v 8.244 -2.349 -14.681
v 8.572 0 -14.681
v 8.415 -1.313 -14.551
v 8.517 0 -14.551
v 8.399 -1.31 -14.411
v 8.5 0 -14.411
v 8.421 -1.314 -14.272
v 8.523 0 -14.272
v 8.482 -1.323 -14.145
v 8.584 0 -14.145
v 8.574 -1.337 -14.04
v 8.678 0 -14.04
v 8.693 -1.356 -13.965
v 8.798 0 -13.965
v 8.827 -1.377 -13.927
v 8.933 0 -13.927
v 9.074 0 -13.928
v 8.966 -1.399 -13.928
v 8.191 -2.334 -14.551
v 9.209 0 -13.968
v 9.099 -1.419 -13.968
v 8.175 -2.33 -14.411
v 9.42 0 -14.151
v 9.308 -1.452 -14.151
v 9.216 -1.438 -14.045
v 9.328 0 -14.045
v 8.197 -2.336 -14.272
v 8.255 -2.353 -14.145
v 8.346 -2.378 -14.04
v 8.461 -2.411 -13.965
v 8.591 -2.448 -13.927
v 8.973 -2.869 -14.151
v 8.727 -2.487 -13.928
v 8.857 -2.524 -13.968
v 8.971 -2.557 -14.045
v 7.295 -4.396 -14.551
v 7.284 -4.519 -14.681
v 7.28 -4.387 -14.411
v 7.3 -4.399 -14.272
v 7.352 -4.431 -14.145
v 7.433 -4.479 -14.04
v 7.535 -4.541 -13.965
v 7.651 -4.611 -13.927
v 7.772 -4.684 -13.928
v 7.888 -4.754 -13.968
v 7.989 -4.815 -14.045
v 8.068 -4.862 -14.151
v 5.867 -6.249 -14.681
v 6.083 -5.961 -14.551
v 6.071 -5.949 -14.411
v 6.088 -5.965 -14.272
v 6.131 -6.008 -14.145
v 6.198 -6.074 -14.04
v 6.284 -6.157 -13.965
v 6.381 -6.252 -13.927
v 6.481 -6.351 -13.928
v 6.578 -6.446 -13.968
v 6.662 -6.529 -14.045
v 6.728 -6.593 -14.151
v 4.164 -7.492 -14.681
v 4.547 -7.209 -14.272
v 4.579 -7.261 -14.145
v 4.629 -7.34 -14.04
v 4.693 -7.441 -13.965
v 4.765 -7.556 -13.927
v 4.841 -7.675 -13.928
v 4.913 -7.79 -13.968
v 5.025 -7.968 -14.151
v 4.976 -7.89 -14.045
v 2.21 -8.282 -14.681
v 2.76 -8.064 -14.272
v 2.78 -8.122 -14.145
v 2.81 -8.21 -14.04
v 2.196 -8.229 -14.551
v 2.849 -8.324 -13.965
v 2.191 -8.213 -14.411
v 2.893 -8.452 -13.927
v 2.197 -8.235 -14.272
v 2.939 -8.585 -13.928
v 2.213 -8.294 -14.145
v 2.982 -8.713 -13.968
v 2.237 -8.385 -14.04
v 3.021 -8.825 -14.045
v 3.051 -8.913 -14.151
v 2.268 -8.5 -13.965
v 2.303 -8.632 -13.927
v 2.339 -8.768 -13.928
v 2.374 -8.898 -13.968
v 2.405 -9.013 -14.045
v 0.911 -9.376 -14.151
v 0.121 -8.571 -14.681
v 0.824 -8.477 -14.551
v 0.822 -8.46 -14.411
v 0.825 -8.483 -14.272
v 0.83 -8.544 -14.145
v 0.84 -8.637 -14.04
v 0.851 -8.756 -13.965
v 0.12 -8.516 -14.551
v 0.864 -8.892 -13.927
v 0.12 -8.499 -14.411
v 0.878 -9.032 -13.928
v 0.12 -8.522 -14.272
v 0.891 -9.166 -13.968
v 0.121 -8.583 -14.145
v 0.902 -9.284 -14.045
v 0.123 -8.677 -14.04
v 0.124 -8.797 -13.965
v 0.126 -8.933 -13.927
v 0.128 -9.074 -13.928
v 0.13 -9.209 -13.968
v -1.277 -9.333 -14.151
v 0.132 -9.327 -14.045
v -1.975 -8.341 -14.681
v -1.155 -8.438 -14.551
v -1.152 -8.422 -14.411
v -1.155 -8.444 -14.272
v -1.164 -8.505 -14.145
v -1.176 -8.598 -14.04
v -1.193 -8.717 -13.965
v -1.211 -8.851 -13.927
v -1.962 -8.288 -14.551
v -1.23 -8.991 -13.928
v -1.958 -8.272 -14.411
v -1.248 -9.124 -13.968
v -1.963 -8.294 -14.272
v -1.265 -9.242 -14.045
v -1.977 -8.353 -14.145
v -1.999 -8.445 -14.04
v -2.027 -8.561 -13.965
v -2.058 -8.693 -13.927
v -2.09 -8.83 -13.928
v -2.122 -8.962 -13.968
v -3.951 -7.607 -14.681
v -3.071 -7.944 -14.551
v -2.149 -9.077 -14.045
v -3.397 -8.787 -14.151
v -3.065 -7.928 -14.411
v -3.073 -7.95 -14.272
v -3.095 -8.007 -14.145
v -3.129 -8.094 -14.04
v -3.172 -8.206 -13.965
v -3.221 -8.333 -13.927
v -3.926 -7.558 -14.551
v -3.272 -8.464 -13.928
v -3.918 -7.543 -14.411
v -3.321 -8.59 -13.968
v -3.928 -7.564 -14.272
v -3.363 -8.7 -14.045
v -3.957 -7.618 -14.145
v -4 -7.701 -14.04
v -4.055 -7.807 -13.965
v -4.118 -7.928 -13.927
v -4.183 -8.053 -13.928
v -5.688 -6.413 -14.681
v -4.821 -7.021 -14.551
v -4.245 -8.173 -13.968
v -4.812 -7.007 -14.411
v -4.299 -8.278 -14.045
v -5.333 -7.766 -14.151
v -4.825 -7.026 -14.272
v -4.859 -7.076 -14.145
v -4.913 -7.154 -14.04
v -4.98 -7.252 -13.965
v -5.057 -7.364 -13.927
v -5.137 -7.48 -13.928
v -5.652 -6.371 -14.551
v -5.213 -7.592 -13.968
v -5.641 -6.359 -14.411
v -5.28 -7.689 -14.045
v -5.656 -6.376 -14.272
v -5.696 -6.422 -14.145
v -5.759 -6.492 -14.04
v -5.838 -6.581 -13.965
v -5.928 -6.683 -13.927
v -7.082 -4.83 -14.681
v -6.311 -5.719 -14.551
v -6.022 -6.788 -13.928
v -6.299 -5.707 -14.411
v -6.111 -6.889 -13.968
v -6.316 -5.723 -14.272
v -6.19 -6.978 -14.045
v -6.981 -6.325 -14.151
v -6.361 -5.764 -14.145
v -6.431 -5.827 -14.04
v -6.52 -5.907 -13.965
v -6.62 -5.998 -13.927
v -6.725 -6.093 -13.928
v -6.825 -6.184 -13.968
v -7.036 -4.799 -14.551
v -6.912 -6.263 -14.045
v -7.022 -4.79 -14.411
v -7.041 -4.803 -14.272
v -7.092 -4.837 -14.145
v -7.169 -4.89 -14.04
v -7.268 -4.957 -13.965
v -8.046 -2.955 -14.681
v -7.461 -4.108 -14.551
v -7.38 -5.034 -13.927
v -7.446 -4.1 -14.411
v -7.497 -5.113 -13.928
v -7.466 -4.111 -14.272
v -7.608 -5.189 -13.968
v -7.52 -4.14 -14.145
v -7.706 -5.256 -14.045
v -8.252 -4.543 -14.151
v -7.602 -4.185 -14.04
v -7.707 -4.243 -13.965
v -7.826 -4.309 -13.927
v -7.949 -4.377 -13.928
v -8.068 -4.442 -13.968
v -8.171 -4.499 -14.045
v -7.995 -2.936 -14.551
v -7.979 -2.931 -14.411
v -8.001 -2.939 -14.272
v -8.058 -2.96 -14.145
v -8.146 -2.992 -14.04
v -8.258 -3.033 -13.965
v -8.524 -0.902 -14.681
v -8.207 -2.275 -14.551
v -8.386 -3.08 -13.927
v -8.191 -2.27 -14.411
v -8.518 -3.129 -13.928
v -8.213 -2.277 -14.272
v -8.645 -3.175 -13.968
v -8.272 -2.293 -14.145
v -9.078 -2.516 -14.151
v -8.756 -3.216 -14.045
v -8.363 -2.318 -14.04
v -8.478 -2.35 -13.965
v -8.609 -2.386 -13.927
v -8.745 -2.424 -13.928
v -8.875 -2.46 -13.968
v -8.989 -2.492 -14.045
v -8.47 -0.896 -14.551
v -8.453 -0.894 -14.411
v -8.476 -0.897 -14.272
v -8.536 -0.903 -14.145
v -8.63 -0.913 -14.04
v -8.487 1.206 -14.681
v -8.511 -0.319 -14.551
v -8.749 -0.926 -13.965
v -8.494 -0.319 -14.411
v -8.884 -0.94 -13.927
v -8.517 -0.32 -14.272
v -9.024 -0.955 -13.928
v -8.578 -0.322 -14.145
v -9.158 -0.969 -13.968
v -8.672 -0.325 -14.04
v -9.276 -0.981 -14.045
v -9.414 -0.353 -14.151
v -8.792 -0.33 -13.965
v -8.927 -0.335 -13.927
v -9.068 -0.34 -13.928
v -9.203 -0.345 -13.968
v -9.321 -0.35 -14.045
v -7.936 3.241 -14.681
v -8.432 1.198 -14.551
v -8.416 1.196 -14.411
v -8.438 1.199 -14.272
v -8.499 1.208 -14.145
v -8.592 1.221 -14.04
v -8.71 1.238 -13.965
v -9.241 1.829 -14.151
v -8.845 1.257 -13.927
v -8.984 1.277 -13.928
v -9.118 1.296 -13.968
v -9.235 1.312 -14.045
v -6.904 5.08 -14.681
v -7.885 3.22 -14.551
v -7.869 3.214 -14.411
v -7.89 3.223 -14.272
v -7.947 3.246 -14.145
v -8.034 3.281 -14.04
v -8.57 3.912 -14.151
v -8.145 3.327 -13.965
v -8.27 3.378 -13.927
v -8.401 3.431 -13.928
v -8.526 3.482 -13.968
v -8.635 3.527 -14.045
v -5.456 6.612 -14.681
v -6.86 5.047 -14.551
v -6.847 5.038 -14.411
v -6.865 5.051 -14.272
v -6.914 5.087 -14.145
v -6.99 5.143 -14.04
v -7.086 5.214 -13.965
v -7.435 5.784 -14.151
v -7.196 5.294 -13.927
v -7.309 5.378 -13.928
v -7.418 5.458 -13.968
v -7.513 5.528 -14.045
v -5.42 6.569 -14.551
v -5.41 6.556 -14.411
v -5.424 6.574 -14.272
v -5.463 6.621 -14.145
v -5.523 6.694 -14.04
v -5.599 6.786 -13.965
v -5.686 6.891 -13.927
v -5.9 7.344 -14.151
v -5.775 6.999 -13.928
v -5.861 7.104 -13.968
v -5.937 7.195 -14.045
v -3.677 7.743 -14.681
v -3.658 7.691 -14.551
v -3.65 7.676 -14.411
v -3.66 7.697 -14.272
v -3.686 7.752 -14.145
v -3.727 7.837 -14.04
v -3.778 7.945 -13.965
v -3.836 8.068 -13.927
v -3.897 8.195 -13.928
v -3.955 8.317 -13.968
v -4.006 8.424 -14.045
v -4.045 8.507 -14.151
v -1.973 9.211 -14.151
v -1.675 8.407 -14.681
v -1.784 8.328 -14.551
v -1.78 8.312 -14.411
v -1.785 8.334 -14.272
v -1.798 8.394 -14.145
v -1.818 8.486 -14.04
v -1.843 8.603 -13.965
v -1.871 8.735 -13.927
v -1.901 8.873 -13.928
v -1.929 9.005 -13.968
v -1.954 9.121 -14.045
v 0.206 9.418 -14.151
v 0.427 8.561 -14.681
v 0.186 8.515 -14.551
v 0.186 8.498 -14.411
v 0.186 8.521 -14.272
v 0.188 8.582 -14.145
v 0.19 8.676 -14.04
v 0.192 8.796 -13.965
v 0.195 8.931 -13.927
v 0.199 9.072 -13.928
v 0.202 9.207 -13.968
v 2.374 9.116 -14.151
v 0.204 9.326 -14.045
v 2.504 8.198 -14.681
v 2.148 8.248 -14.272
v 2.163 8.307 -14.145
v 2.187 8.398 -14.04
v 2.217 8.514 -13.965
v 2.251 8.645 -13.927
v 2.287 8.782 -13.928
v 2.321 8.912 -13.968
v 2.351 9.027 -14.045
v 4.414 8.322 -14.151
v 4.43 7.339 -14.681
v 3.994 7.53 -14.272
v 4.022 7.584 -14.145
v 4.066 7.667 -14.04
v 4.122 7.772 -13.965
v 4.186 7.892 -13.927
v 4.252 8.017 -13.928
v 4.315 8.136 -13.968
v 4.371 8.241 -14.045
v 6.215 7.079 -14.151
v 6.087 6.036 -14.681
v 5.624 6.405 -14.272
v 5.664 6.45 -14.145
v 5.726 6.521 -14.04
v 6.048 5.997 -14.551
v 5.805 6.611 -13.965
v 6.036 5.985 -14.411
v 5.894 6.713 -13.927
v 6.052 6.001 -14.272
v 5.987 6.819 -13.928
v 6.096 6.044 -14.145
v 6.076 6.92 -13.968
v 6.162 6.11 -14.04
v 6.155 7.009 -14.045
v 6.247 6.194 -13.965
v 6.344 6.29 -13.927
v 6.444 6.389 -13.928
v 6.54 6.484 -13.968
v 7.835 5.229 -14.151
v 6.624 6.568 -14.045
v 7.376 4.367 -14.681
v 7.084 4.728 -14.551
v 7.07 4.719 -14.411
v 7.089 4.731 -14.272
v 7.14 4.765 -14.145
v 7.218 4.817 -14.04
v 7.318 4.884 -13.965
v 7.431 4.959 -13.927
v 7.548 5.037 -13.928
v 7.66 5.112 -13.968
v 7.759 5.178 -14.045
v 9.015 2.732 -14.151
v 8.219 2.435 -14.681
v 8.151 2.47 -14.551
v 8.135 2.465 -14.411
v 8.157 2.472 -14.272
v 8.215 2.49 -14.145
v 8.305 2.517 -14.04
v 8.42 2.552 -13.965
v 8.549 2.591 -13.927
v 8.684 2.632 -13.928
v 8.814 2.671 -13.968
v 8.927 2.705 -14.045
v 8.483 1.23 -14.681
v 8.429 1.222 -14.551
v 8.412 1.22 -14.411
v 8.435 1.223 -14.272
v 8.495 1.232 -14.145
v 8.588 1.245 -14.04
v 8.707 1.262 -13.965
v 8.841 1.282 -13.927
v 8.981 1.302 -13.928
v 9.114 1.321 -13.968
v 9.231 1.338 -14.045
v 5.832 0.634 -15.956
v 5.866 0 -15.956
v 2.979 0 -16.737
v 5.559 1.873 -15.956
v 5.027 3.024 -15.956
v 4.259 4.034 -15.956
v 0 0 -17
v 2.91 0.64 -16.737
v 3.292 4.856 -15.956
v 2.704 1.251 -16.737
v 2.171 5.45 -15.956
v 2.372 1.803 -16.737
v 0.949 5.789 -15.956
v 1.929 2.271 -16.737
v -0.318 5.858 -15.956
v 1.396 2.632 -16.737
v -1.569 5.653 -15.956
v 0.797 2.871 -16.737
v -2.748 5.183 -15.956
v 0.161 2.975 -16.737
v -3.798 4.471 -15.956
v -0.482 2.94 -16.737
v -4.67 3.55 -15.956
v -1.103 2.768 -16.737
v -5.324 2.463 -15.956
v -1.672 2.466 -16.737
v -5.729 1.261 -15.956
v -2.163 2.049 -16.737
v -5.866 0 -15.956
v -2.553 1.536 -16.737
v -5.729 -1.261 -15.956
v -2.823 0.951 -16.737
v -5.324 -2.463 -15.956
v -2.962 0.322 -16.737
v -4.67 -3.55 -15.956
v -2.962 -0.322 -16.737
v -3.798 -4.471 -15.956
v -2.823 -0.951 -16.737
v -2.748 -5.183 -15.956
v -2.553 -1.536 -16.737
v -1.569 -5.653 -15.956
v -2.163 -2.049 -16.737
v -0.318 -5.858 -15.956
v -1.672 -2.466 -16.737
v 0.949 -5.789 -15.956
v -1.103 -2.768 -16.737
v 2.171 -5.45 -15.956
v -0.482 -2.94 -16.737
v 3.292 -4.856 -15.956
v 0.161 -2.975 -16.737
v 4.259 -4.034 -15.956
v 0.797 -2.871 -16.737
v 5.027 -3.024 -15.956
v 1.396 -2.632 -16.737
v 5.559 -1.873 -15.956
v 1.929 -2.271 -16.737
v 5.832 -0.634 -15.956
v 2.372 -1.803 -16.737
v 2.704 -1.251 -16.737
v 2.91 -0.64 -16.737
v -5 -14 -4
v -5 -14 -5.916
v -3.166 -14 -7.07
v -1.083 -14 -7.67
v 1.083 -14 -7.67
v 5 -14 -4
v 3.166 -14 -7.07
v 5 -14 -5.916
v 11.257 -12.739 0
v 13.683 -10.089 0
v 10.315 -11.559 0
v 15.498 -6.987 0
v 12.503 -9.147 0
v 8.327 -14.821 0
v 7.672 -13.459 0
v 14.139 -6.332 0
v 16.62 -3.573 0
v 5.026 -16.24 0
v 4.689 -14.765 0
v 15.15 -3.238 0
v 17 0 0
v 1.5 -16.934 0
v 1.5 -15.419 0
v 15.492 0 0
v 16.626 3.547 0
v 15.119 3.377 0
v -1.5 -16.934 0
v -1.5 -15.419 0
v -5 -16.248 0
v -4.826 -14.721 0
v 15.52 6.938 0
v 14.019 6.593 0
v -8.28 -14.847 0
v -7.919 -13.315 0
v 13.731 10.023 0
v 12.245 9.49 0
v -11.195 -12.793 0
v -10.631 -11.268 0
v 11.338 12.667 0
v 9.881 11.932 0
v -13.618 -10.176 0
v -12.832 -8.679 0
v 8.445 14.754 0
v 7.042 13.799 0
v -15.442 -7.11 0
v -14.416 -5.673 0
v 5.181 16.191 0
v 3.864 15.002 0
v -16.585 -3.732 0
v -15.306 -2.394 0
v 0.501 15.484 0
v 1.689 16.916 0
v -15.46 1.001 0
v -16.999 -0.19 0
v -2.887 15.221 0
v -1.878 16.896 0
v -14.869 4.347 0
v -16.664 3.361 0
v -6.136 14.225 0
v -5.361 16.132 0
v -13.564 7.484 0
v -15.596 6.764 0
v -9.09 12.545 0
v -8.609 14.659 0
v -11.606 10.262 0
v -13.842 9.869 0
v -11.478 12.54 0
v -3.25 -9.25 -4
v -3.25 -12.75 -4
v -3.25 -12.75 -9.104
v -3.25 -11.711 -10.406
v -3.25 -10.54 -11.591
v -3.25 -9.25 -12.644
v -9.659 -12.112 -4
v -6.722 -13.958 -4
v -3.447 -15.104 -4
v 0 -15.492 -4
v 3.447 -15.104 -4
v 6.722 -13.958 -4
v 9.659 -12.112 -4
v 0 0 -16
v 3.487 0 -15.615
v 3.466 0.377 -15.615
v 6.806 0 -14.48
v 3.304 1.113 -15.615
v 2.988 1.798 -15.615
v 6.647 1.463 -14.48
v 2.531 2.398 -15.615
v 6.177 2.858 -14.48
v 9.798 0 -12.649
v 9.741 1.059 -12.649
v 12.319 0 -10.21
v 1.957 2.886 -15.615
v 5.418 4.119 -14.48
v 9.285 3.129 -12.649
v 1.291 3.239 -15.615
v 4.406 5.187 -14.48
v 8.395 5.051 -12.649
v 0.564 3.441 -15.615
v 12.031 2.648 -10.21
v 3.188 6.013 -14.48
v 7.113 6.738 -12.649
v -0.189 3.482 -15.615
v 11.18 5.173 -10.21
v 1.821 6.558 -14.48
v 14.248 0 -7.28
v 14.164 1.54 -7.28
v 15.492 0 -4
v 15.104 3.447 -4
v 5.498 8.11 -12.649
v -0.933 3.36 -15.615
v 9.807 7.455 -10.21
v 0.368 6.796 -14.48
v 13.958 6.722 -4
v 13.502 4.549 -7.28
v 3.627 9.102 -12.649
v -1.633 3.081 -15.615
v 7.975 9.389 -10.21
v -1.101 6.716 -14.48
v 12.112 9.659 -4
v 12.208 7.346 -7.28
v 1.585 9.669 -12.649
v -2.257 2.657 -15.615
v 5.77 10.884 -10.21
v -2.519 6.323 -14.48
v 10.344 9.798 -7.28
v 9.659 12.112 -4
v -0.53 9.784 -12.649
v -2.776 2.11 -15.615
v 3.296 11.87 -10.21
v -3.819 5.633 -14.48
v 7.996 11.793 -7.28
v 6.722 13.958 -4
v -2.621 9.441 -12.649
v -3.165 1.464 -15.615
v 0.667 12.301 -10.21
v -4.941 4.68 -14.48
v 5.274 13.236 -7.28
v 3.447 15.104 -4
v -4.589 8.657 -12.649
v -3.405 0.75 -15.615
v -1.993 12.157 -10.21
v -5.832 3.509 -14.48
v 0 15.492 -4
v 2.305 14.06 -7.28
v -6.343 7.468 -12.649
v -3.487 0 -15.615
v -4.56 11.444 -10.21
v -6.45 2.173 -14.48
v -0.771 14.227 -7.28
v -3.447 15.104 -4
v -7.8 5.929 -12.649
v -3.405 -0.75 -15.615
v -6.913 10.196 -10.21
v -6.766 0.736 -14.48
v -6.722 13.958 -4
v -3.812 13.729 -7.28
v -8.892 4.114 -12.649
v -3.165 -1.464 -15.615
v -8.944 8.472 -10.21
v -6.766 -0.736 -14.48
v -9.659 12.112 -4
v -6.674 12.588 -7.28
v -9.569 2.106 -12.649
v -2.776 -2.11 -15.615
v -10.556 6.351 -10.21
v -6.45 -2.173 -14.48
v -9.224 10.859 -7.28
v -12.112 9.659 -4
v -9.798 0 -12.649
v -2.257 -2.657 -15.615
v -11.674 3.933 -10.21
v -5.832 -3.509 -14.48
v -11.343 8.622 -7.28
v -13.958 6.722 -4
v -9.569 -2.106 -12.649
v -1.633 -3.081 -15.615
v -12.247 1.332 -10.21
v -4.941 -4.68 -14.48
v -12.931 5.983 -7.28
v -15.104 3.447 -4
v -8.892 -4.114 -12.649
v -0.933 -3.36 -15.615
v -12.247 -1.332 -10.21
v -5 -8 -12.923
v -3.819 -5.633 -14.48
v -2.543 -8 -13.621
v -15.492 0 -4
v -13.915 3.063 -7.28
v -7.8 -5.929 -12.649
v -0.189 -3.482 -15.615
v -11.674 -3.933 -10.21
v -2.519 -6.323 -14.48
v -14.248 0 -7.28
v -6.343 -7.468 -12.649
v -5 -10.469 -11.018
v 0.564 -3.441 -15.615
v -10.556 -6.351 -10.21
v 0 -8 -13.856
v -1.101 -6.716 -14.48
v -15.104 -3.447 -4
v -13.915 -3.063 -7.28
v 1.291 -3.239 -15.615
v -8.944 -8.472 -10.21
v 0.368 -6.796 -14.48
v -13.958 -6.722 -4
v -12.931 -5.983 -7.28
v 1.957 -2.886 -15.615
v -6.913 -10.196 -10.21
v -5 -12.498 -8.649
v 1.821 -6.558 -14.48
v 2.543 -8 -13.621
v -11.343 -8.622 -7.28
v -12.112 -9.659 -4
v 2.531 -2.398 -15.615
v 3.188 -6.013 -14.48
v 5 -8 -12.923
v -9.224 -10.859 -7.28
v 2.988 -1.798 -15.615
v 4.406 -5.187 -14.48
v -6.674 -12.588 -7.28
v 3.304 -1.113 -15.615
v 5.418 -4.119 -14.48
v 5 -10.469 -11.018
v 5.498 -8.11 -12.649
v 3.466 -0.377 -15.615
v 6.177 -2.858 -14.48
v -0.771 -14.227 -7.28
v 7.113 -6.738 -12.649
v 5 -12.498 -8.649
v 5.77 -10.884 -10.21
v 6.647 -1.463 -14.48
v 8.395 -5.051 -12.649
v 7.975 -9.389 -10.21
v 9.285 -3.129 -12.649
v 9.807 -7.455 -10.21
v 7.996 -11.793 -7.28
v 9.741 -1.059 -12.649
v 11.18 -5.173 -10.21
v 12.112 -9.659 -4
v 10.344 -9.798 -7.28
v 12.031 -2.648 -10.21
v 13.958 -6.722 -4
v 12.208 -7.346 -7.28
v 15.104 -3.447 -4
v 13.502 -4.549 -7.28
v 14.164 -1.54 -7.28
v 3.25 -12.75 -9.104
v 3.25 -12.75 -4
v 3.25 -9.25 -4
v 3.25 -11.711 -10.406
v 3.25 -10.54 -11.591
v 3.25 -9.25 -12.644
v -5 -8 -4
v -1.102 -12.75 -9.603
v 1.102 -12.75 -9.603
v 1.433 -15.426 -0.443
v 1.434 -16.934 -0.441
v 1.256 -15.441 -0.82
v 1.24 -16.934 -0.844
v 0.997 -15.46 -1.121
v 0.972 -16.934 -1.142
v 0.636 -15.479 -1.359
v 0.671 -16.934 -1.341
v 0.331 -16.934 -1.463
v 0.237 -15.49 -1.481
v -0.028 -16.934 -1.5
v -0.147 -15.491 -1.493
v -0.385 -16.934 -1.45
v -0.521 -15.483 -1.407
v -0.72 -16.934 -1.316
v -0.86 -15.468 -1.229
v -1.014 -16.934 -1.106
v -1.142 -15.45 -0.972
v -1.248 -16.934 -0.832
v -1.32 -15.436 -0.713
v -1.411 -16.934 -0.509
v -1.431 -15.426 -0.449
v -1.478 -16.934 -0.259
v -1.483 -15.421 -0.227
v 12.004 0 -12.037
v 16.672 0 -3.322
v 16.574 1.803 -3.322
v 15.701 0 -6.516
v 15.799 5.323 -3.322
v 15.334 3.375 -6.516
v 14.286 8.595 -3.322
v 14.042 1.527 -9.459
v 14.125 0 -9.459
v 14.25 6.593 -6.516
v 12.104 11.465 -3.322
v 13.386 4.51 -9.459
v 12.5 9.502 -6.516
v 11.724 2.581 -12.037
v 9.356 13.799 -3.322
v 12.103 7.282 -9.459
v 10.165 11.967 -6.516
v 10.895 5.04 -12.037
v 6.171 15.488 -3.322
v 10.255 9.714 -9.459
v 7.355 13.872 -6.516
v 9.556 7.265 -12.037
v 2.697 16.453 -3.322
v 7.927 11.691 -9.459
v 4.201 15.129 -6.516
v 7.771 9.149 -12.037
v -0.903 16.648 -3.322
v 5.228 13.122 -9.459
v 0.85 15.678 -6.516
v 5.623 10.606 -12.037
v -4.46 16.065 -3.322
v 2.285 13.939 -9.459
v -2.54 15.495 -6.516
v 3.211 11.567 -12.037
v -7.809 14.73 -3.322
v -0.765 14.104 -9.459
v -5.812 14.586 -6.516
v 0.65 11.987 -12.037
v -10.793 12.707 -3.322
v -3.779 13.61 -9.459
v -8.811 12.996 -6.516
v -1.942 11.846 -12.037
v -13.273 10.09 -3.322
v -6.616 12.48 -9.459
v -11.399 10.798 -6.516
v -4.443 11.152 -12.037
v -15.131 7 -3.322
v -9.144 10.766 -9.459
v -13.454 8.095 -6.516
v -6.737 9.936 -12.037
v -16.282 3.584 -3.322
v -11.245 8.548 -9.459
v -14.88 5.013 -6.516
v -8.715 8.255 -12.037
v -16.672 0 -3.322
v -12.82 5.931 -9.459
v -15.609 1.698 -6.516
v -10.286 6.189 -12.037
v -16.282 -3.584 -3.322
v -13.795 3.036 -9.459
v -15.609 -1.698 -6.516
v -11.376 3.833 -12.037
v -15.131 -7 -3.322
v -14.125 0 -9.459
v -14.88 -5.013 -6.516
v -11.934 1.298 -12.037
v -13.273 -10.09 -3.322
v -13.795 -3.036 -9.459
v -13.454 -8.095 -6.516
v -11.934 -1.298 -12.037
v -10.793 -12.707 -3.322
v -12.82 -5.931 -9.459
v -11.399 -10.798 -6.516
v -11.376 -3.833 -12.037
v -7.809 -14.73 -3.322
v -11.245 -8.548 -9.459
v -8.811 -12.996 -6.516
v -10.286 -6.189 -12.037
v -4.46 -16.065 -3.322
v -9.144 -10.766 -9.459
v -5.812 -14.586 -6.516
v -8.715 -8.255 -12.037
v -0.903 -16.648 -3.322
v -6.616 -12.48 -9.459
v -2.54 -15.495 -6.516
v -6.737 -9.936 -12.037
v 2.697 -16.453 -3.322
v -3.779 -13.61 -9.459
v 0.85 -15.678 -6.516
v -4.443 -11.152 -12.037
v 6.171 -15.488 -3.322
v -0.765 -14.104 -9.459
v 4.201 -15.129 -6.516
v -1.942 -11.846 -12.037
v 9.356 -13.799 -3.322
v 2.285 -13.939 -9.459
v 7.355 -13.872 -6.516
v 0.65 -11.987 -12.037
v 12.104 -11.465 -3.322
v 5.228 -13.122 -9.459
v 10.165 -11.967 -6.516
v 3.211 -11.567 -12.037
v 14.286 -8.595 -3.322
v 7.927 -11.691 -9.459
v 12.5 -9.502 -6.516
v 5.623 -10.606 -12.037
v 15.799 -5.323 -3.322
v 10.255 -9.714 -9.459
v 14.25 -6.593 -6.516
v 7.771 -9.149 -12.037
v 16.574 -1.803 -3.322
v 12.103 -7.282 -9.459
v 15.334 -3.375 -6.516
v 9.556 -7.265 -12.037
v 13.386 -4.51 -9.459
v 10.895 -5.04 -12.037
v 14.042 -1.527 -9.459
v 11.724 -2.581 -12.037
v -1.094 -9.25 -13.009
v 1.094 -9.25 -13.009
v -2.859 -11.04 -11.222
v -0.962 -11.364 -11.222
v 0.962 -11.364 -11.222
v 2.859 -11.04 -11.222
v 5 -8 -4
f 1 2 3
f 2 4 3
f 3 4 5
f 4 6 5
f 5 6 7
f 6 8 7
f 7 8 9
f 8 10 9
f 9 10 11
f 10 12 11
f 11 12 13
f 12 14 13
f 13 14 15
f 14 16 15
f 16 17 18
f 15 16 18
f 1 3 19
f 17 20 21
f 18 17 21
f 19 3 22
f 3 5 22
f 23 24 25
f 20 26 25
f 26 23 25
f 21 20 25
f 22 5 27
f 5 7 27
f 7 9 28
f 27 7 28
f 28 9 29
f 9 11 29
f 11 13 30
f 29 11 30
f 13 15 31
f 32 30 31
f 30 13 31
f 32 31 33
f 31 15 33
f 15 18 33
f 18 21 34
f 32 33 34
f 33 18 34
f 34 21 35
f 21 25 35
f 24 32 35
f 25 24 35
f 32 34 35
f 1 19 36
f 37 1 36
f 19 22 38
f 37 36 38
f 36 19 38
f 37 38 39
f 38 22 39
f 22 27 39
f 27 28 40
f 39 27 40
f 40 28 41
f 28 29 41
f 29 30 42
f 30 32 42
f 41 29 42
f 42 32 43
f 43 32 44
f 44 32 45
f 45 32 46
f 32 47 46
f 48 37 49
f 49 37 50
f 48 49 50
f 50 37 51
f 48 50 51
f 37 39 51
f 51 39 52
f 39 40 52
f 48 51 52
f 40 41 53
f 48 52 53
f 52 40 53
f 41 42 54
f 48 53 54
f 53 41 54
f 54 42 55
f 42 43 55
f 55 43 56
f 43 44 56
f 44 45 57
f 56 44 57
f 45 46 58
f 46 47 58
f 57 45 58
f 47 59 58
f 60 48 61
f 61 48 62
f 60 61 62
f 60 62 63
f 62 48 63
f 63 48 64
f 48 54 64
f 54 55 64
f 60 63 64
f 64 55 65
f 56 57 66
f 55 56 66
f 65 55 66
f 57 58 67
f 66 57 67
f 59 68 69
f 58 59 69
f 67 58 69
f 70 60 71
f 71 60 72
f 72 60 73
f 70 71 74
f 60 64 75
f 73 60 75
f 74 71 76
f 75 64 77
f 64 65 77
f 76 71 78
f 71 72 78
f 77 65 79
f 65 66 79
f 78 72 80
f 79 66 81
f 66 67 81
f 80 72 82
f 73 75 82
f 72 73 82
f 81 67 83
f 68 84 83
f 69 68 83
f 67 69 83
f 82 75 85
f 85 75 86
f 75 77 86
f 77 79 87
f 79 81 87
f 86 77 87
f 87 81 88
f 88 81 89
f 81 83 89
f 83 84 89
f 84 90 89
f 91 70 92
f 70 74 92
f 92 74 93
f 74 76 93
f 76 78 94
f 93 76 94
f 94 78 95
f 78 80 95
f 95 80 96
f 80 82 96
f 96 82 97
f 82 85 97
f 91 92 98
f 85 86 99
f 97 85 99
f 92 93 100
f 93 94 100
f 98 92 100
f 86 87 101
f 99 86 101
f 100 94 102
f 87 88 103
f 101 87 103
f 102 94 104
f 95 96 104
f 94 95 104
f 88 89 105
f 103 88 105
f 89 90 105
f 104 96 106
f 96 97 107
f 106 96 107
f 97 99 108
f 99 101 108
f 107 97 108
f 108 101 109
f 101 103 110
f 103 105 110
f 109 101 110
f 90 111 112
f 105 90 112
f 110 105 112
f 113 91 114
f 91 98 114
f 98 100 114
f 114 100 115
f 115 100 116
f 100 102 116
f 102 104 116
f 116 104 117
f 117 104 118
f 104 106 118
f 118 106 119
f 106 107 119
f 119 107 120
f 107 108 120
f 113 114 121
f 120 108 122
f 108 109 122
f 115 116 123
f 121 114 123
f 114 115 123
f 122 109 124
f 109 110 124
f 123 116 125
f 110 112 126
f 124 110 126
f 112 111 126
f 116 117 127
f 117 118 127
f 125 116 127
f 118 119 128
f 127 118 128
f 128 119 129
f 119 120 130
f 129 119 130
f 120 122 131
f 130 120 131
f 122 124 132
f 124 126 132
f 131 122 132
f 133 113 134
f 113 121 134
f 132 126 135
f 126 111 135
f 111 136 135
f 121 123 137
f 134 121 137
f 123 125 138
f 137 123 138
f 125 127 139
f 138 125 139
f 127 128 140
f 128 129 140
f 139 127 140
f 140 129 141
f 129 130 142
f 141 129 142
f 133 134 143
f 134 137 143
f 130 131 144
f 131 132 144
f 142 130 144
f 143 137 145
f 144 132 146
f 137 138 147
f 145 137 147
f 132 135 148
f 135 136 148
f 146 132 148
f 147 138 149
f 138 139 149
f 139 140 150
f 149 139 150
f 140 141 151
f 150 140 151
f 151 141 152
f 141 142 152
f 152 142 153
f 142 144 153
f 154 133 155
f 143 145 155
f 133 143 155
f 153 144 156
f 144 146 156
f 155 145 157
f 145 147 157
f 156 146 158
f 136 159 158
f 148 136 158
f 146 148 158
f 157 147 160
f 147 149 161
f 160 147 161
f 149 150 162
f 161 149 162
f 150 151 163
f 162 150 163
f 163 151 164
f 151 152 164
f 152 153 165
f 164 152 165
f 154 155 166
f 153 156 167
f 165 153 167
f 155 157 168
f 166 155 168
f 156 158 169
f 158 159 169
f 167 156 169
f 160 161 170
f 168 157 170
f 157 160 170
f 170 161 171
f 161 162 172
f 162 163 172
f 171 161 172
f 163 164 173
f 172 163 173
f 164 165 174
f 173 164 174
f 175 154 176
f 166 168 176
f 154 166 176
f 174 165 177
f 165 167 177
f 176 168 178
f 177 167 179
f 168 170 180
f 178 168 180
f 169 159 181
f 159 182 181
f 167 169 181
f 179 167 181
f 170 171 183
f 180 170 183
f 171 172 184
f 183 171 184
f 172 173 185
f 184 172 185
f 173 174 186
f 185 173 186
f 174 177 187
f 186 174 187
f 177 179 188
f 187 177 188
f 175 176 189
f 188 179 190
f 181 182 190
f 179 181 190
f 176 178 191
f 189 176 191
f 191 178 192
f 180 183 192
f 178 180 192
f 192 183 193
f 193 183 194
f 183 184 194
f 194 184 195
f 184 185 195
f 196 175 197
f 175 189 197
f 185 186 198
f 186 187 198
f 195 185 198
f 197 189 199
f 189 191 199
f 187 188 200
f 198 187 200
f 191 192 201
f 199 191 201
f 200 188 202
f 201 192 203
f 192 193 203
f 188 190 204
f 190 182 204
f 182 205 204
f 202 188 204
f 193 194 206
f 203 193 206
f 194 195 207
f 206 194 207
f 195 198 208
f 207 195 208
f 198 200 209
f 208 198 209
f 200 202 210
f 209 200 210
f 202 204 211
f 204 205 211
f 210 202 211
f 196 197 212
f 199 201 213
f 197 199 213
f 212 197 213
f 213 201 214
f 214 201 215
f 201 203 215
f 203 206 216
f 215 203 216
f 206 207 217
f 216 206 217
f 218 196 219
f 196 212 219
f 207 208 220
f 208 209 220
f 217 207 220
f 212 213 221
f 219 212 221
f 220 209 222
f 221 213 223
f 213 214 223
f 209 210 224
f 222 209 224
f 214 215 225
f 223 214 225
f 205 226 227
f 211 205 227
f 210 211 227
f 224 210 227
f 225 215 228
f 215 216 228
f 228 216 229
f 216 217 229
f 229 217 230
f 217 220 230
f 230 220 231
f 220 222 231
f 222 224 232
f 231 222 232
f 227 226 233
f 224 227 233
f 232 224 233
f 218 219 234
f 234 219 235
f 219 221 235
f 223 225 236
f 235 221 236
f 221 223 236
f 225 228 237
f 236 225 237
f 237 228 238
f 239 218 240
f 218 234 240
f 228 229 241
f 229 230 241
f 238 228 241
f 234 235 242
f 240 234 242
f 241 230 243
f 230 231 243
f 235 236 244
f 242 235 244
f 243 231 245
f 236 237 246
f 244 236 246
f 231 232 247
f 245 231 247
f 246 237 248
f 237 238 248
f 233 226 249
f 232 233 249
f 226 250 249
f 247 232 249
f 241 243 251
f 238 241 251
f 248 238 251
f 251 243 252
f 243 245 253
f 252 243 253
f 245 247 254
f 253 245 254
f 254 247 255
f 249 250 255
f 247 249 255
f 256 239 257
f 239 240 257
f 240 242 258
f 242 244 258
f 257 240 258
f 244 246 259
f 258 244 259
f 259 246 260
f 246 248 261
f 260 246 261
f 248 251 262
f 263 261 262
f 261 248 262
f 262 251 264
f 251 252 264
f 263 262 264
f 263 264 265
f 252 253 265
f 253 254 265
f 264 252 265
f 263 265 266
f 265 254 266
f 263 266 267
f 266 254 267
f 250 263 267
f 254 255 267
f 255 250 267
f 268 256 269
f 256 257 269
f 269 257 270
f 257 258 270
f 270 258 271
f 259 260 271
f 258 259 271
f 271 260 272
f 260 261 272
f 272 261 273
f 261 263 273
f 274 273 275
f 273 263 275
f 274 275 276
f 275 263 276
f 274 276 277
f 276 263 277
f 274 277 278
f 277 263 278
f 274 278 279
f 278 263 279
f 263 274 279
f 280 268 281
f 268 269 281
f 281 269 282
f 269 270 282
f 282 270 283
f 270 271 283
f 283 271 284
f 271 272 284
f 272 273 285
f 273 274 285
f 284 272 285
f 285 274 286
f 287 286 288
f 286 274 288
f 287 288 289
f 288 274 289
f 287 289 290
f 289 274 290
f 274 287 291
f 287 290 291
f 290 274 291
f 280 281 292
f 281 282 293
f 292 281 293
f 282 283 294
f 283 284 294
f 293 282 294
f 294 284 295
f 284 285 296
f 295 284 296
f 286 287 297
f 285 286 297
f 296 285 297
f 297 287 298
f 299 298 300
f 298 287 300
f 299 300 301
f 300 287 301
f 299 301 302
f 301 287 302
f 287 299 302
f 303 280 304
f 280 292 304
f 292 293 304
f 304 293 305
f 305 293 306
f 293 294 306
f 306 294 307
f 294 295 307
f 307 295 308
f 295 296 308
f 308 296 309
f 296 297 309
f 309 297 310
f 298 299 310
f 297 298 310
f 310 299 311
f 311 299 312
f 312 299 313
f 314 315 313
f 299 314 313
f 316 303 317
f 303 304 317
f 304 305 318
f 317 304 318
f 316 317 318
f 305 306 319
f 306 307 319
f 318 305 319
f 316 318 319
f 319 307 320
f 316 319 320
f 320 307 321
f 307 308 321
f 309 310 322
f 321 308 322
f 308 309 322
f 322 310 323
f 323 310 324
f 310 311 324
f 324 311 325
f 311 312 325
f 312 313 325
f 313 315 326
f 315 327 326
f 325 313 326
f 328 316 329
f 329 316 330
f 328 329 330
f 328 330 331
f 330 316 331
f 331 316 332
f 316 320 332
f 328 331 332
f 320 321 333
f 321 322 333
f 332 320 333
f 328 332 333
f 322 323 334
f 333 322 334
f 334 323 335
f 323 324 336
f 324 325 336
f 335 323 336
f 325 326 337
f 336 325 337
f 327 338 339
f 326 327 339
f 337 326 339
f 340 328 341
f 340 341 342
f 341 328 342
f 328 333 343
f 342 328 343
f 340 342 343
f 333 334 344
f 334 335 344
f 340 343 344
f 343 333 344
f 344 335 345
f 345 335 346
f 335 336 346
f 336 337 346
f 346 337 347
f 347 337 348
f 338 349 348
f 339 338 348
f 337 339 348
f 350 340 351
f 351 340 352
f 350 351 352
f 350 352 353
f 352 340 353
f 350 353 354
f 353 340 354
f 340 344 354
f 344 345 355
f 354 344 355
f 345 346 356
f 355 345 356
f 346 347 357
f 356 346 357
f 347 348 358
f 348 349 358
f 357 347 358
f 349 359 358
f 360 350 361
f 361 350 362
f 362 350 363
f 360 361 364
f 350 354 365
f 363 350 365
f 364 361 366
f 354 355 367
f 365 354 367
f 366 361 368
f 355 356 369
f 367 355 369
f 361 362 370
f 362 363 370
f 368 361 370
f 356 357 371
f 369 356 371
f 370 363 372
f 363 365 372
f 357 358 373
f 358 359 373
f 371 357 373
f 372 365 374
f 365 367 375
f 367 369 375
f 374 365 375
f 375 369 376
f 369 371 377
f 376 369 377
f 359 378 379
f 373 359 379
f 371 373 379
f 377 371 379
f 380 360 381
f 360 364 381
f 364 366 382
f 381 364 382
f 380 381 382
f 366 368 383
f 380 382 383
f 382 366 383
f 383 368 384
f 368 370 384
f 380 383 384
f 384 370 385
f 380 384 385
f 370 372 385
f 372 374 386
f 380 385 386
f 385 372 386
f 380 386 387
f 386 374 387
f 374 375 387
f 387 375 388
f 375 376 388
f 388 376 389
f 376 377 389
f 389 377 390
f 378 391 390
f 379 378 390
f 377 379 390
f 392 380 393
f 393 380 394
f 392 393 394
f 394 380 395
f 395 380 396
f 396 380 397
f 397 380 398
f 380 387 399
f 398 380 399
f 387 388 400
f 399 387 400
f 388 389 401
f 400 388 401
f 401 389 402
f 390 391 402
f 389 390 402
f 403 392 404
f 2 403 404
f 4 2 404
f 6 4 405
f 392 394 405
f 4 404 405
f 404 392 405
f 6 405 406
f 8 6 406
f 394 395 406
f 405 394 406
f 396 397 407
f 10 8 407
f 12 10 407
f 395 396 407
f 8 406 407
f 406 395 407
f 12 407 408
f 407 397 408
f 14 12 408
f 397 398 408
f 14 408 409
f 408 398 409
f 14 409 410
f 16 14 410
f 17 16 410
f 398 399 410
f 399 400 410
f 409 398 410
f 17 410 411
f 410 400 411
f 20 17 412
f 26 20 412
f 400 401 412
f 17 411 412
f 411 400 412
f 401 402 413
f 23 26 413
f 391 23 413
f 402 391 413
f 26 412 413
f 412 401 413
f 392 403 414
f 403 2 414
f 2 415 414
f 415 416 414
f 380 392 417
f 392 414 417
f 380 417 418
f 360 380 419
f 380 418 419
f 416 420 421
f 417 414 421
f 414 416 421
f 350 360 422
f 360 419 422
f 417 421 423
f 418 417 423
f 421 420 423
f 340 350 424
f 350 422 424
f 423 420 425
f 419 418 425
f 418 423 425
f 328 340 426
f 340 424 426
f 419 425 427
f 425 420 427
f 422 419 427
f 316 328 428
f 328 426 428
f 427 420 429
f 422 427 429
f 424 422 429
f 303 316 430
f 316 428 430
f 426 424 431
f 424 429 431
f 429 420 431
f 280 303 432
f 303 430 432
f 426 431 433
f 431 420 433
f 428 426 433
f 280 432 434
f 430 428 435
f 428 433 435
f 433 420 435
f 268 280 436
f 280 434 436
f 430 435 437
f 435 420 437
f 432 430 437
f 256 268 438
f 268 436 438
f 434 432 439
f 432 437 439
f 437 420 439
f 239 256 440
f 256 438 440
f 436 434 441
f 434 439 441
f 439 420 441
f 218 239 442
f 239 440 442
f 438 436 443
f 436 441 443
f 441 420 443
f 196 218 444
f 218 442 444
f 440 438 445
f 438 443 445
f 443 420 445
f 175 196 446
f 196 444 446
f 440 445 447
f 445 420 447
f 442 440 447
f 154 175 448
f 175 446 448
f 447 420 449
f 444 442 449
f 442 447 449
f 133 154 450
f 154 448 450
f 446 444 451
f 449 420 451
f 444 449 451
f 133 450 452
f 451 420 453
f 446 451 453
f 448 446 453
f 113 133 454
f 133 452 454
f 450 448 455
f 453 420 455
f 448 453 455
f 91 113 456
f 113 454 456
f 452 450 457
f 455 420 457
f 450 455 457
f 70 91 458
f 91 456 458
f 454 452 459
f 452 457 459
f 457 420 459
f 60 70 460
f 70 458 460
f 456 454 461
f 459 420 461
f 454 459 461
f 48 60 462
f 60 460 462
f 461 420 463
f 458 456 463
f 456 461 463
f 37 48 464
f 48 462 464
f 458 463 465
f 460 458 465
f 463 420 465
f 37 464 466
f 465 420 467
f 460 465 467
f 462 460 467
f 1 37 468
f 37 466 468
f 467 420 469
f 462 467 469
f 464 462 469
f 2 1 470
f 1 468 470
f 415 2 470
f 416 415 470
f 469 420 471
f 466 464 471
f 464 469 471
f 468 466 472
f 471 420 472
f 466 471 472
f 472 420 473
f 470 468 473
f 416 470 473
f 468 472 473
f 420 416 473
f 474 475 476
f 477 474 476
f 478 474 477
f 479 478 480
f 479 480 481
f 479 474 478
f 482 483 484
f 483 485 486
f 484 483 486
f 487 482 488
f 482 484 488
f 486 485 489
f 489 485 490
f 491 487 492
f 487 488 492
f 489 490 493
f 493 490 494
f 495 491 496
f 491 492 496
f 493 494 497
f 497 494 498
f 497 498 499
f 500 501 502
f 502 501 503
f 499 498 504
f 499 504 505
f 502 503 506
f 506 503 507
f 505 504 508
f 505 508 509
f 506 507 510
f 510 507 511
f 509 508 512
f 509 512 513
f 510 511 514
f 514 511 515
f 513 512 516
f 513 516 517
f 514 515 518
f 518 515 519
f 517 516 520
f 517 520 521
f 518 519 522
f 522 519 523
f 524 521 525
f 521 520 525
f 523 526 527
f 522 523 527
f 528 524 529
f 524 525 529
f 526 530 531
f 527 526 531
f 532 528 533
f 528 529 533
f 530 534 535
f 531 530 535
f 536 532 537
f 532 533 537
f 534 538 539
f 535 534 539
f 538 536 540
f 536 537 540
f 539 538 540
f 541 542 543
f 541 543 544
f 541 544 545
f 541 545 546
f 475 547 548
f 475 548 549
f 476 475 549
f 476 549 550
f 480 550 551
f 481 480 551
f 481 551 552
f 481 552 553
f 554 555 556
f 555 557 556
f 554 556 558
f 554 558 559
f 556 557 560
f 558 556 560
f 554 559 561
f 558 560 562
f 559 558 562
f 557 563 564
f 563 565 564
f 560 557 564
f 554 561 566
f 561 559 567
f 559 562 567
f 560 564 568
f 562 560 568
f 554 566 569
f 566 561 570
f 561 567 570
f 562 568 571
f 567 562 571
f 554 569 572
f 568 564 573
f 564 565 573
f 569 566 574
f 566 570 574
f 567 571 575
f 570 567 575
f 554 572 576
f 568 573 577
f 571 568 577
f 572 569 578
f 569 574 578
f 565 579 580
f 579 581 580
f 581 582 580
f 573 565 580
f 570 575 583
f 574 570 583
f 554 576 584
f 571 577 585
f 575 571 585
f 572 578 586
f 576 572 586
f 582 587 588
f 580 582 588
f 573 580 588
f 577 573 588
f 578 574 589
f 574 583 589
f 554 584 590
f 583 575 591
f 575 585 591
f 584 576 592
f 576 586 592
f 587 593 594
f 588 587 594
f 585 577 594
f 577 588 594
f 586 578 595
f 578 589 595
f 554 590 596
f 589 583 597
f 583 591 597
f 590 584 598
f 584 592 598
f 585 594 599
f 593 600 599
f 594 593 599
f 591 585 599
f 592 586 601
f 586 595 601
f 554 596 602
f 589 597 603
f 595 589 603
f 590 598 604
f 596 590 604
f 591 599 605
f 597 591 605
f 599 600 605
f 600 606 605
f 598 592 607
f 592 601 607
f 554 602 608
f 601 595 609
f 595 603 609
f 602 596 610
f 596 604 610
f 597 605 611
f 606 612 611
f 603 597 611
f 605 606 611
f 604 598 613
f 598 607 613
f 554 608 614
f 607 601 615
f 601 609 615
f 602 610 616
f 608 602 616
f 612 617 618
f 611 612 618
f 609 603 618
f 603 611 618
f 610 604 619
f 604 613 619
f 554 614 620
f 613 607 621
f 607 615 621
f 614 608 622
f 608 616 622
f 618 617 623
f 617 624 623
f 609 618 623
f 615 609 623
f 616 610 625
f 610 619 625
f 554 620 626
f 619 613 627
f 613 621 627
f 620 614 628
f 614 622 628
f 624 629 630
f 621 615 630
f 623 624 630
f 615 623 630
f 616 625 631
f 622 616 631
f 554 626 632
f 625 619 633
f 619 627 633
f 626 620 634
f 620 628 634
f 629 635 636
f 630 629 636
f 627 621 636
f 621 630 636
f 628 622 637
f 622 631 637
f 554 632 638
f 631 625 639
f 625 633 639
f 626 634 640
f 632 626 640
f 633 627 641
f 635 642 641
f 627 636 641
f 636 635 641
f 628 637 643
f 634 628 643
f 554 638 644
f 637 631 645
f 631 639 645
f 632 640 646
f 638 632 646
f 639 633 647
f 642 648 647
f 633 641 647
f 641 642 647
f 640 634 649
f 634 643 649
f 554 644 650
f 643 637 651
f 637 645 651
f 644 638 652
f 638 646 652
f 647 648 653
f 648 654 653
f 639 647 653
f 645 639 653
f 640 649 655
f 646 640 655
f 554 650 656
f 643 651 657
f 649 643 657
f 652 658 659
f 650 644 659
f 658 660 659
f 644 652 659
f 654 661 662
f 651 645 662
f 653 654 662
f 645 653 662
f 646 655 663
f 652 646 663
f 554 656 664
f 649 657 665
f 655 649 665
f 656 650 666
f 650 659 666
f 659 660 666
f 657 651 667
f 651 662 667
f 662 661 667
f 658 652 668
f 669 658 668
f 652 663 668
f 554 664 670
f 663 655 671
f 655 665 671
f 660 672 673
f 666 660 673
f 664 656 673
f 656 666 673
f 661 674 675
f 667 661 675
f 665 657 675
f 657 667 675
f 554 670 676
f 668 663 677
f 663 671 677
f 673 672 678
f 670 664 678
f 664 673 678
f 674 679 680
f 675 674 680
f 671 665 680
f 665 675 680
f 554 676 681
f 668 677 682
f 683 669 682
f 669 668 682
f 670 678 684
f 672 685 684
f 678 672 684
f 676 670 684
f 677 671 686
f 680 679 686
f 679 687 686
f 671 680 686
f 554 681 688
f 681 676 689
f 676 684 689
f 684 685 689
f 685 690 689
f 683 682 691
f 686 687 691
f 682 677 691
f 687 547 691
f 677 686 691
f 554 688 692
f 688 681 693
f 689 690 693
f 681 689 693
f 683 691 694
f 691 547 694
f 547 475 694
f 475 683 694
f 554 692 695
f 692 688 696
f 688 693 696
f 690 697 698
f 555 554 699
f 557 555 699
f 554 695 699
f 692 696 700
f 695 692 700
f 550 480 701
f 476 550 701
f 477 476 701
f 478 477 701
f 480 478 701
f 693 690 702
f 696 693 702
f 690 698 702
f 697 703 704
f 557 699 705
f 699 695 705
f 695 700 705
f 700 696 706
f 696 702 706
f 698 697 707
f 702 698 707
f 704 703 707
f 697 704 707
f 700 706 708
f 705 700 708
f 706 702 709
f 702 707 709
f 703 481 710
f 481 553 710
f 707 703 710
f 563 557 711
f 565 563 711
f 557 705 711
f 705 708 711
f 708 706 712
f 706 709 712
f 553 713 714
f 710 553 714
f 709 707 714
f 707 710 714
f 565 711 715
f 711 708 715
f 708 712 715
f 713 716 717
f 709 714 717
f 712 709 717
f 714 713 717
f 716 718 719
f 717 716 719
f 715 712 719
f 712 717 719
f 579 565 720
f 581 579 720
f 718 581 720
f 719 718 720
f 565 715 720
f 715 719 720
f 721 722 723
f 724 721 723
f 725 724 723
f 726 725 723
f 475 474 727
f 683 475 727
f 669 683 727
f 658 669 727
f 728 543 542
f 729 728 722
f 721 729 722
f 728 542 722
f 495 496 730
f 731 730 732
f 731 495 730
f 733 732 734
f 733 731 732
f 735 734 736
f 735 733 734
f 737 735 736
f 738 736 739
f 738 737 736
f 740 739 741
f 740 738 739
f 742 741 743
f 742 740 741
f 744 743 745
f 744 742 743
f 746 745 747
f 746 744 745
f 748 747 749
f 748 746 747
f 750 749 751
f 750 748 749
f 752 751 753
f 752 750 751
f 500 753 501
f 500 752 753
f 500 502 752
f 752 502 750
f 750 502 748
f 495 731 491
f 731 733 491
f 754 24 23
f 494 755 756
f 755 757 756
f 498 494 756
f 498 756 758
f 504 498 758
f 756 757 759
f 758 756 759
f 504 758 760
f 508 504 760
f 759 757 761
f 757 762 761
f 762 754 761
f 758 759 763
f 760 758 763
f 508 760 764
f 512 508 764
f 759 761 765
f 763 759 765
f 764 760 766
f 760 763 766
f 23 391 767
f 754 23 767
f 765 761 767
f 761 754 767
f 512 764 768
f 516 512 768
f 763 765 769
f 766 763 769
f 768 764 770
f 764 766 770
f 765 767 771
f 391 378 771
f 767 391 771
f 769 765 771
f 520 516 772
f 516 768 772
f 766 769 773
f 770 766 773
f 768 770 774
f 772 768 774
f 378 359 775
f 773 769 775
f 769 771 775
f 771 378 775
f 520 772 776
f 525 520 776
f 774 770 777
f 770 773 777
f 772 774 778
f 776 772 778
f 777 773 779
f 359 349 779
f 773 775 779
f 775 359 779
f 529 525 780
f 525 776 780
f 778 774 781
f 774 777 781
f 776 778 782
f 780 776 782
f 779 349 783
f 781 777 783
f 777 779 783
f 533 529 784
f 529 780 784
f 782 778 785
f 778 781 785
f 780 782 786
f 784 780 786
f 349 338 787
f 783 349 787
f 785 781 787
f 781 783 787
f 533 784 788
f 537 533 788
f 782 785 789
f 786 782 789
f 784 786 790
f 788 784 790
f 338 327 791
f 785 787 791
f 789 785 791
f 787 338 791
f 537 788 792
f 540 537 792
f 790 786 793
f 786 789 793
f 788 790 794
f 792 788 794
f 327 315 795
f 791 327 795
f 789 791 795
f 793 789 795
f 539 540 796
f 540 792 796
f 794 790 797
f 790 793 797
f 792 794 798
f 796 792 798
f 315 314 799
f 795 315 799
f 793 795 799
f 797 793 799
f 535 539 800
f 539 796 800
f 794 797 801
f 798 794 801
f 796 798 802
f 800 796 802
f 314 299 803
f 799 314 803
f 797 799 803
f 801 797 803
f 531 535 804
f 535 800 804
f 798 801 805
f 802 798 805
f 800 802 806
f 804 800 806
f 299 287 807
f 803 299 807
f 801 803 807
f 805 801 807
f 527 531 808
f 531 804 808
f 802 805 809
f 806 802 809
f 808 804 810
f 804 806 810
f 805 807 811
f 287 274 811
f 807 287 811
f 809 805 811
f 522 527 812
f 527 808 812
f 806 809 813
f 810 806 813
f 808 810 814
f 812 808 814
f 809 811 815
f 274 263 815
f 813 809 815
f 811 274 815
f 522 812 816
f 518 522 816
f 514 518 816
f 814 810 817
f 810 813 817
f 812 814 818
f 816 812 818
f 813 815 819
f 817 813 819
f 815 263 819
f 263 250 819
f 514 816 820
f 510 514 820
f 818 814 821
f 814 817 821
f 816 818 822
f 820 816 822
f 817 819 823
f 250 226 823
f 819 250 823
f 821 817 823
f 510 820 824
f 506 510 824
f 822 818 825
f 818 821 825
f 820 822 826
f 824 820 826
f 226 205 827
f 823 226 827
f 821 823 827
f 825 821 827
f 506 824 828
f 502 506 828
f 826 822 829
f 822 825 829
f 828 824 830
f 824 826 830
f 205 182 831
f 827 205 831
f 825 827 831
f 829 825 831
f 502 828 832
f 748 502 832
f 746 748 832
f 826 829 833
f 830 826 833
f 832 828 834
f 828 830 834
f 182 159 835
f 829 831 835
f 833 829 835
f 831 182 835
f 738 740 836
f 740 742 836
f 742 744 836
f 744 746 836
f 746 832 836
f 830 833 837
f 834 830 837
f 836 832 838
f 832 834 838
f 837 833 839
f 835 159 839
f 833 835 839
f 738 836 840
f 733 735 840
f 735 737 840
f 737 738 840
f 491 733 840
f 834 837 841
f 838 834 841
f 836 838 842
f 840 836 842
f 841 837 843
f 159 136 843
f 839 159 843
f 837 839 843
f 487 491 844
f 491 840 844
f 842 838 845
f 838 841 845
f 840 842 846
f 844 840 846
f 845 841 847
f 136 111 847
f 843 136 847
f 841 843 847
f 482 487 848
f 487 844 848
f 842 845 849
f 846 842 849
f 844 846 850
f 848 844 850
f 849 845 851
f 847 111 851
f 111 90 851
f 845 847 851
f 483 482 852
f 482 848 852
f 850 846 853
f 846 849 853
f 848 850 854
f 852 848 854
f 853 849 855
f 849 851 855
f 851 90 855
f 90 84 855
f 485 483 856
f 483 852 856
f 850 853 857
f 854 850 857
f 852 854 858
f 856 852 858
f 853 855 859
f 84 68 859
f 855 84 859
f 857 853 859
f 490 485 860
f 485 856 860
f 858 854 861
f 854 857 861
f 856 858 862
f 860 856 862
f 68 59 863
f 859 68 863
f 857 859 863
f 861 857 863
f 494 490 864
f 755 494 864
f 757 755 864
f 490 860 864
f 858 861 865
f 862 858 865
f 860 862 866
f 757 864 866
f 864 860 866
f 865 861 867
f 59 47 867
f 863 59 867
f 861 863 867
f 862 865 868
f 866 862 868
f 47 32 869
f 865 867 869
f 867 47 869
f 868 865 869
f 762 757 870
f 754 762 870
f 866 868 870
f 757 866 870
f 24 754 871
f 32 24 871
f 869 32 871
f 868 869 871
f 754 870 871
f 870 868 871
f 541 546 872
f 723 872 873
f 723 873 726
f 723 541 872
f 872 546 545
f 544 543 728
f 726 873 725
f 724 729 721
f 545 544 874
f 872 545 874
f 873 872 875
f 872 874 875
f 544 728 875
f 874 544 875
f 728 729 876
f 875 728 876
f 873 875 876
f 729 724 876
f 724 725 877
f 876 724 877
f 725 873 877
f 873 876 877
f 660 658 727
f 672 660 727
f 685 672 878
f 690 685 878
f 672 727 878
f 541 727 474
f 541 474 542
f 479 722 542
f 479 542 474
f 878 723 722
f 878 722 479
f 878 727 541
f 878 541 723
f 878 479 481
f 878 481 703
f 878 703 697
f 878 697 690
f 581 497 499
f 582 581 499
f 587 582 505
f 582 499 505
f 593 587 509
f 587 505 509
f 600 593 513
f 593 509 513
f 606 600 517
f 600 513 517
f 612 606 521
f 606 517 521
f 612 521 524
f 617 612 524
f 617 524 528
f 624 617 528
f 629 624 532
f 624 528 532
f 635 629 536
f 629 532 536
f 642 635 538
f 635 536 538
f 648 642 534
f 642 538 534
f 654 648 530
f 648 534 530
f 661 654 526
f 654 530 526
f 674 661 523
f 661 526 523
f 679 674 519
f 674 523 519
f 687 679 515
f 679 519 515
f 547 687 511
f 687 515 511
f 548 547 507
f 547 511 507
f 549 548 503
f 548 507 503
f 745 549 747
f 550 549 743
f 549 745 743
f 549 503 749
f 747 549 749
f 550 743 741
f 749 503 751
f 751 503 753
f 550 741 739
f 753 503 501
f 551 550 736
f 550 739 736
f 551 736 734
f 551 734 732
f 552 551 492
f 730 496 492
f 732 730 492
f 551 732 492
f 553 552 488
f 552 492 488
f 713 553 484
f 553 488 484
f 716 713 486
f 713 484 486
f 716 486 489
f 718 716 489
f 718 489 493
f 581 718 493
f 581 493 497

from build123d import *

# Parameters (mm, degrees)
CUT_EXTRUDE_START    = -17
CUT_EXTRUDE_1_DEPTH  = 1.580856159
EXTRUDE_1_REACH      = 29.331
EXTRUDE_1_END_RADIUS = 16
SKETCH_3_W           = 10
SKETCH_3_H           = 6
SKETCH_3_W_2         = 6.5
SKETCH_3_H_2         = 3.5
SKETCH_4_R           = 0.5


# Read off the part's stored shape, not the designer's step: 切除-拉伸1
with BuildPart() as part:
    # 草图1 → 旋转1 (revolve)
    with BuildSketch(Plane(origin=(0, 0, 0), x_dir=(1, 0, 0), z_dir=(0, 1, 0))):
        with BuildLine():
            Line((15.491933385, 4), (15.491933385, 0))
            Line((15.491933385, 0), (17, 0))
            ThreePointArc((17, 0), (12.02081528, 12.02081528), (0, 17))
            Line((0, 17), (0, 16))
            ThreePointArc((0, 16), (9.797958971, 12.649110641), (15.491933385, 4))
        make_face()
    revolve(axis=Axis((0, 0, -17), (0, 0, 1)))

    # 切除-拉伸1 outline → 切除-拉伸1 (cut)
    with BuildSketch(Plane(origin=(0, 0, 0), x_dir=(1, 0, 0), z_dir=(0, 1, 0)).offset(CUT_EXTRUDE_START)):
        with BuildLine():
            Line((-1.5, 0), (1.5, 0))
            ThreePointArc((1.5, 0), (0, 1.5), (-1.5, 0))
        make_face()
    extrude(amount=CUT_EXTRUDE_1_DEPTH, mode=Mode.SUBTRACT)

    # 凸台-拉伸1: up to this sphere (the profile starts inside it)
    extrude_1_end = Location((0, 0, 0)) * Sphere(EXTRUDE_1_END_RADIUS, mode=Mode.PRIVATE)
    # 草图3 → 凸台-拉伸1 (add, up to the surface)
    with BuildSketch(Plane.XY.offset(-4), mode=Mode.PRIVATE) as extrude_1_sk1:
        with Locations((0, -11)):
            Rectangle(SKETCH_3_W, SKETCH_3_H)
        with Locations((0, -11)):
            Rectangle(SKETCH_3_W_2, SKETCH_3_H_2, mode=Mode.SUBTRACT)
    extrude_1_tool1 = extrude(extrude_1_sk1.sketch, amount=-EXTRUDE_1_REACH, mode=Mode.PRIVATE) & extrude_1_end
    add(extrude_1_tool1.solids().sort_by_distance((0, -8.116619, -4))[0])

    # 草图4 → 切除-旋转1 (revolve, cut)
    with BuildSketch(Plane(origin=(0, 0, 0), x_dir=(1, 0, 0), z_dir=(0, 1, 0))):
        with Locations((9, 14.422205102)):
            Circle(SKETCH_4_R)
    revolve(axis=Axis((0, 0, 0), (0, 0, -1)), mode=Mode.SUBTRACT)


solid = part.part
